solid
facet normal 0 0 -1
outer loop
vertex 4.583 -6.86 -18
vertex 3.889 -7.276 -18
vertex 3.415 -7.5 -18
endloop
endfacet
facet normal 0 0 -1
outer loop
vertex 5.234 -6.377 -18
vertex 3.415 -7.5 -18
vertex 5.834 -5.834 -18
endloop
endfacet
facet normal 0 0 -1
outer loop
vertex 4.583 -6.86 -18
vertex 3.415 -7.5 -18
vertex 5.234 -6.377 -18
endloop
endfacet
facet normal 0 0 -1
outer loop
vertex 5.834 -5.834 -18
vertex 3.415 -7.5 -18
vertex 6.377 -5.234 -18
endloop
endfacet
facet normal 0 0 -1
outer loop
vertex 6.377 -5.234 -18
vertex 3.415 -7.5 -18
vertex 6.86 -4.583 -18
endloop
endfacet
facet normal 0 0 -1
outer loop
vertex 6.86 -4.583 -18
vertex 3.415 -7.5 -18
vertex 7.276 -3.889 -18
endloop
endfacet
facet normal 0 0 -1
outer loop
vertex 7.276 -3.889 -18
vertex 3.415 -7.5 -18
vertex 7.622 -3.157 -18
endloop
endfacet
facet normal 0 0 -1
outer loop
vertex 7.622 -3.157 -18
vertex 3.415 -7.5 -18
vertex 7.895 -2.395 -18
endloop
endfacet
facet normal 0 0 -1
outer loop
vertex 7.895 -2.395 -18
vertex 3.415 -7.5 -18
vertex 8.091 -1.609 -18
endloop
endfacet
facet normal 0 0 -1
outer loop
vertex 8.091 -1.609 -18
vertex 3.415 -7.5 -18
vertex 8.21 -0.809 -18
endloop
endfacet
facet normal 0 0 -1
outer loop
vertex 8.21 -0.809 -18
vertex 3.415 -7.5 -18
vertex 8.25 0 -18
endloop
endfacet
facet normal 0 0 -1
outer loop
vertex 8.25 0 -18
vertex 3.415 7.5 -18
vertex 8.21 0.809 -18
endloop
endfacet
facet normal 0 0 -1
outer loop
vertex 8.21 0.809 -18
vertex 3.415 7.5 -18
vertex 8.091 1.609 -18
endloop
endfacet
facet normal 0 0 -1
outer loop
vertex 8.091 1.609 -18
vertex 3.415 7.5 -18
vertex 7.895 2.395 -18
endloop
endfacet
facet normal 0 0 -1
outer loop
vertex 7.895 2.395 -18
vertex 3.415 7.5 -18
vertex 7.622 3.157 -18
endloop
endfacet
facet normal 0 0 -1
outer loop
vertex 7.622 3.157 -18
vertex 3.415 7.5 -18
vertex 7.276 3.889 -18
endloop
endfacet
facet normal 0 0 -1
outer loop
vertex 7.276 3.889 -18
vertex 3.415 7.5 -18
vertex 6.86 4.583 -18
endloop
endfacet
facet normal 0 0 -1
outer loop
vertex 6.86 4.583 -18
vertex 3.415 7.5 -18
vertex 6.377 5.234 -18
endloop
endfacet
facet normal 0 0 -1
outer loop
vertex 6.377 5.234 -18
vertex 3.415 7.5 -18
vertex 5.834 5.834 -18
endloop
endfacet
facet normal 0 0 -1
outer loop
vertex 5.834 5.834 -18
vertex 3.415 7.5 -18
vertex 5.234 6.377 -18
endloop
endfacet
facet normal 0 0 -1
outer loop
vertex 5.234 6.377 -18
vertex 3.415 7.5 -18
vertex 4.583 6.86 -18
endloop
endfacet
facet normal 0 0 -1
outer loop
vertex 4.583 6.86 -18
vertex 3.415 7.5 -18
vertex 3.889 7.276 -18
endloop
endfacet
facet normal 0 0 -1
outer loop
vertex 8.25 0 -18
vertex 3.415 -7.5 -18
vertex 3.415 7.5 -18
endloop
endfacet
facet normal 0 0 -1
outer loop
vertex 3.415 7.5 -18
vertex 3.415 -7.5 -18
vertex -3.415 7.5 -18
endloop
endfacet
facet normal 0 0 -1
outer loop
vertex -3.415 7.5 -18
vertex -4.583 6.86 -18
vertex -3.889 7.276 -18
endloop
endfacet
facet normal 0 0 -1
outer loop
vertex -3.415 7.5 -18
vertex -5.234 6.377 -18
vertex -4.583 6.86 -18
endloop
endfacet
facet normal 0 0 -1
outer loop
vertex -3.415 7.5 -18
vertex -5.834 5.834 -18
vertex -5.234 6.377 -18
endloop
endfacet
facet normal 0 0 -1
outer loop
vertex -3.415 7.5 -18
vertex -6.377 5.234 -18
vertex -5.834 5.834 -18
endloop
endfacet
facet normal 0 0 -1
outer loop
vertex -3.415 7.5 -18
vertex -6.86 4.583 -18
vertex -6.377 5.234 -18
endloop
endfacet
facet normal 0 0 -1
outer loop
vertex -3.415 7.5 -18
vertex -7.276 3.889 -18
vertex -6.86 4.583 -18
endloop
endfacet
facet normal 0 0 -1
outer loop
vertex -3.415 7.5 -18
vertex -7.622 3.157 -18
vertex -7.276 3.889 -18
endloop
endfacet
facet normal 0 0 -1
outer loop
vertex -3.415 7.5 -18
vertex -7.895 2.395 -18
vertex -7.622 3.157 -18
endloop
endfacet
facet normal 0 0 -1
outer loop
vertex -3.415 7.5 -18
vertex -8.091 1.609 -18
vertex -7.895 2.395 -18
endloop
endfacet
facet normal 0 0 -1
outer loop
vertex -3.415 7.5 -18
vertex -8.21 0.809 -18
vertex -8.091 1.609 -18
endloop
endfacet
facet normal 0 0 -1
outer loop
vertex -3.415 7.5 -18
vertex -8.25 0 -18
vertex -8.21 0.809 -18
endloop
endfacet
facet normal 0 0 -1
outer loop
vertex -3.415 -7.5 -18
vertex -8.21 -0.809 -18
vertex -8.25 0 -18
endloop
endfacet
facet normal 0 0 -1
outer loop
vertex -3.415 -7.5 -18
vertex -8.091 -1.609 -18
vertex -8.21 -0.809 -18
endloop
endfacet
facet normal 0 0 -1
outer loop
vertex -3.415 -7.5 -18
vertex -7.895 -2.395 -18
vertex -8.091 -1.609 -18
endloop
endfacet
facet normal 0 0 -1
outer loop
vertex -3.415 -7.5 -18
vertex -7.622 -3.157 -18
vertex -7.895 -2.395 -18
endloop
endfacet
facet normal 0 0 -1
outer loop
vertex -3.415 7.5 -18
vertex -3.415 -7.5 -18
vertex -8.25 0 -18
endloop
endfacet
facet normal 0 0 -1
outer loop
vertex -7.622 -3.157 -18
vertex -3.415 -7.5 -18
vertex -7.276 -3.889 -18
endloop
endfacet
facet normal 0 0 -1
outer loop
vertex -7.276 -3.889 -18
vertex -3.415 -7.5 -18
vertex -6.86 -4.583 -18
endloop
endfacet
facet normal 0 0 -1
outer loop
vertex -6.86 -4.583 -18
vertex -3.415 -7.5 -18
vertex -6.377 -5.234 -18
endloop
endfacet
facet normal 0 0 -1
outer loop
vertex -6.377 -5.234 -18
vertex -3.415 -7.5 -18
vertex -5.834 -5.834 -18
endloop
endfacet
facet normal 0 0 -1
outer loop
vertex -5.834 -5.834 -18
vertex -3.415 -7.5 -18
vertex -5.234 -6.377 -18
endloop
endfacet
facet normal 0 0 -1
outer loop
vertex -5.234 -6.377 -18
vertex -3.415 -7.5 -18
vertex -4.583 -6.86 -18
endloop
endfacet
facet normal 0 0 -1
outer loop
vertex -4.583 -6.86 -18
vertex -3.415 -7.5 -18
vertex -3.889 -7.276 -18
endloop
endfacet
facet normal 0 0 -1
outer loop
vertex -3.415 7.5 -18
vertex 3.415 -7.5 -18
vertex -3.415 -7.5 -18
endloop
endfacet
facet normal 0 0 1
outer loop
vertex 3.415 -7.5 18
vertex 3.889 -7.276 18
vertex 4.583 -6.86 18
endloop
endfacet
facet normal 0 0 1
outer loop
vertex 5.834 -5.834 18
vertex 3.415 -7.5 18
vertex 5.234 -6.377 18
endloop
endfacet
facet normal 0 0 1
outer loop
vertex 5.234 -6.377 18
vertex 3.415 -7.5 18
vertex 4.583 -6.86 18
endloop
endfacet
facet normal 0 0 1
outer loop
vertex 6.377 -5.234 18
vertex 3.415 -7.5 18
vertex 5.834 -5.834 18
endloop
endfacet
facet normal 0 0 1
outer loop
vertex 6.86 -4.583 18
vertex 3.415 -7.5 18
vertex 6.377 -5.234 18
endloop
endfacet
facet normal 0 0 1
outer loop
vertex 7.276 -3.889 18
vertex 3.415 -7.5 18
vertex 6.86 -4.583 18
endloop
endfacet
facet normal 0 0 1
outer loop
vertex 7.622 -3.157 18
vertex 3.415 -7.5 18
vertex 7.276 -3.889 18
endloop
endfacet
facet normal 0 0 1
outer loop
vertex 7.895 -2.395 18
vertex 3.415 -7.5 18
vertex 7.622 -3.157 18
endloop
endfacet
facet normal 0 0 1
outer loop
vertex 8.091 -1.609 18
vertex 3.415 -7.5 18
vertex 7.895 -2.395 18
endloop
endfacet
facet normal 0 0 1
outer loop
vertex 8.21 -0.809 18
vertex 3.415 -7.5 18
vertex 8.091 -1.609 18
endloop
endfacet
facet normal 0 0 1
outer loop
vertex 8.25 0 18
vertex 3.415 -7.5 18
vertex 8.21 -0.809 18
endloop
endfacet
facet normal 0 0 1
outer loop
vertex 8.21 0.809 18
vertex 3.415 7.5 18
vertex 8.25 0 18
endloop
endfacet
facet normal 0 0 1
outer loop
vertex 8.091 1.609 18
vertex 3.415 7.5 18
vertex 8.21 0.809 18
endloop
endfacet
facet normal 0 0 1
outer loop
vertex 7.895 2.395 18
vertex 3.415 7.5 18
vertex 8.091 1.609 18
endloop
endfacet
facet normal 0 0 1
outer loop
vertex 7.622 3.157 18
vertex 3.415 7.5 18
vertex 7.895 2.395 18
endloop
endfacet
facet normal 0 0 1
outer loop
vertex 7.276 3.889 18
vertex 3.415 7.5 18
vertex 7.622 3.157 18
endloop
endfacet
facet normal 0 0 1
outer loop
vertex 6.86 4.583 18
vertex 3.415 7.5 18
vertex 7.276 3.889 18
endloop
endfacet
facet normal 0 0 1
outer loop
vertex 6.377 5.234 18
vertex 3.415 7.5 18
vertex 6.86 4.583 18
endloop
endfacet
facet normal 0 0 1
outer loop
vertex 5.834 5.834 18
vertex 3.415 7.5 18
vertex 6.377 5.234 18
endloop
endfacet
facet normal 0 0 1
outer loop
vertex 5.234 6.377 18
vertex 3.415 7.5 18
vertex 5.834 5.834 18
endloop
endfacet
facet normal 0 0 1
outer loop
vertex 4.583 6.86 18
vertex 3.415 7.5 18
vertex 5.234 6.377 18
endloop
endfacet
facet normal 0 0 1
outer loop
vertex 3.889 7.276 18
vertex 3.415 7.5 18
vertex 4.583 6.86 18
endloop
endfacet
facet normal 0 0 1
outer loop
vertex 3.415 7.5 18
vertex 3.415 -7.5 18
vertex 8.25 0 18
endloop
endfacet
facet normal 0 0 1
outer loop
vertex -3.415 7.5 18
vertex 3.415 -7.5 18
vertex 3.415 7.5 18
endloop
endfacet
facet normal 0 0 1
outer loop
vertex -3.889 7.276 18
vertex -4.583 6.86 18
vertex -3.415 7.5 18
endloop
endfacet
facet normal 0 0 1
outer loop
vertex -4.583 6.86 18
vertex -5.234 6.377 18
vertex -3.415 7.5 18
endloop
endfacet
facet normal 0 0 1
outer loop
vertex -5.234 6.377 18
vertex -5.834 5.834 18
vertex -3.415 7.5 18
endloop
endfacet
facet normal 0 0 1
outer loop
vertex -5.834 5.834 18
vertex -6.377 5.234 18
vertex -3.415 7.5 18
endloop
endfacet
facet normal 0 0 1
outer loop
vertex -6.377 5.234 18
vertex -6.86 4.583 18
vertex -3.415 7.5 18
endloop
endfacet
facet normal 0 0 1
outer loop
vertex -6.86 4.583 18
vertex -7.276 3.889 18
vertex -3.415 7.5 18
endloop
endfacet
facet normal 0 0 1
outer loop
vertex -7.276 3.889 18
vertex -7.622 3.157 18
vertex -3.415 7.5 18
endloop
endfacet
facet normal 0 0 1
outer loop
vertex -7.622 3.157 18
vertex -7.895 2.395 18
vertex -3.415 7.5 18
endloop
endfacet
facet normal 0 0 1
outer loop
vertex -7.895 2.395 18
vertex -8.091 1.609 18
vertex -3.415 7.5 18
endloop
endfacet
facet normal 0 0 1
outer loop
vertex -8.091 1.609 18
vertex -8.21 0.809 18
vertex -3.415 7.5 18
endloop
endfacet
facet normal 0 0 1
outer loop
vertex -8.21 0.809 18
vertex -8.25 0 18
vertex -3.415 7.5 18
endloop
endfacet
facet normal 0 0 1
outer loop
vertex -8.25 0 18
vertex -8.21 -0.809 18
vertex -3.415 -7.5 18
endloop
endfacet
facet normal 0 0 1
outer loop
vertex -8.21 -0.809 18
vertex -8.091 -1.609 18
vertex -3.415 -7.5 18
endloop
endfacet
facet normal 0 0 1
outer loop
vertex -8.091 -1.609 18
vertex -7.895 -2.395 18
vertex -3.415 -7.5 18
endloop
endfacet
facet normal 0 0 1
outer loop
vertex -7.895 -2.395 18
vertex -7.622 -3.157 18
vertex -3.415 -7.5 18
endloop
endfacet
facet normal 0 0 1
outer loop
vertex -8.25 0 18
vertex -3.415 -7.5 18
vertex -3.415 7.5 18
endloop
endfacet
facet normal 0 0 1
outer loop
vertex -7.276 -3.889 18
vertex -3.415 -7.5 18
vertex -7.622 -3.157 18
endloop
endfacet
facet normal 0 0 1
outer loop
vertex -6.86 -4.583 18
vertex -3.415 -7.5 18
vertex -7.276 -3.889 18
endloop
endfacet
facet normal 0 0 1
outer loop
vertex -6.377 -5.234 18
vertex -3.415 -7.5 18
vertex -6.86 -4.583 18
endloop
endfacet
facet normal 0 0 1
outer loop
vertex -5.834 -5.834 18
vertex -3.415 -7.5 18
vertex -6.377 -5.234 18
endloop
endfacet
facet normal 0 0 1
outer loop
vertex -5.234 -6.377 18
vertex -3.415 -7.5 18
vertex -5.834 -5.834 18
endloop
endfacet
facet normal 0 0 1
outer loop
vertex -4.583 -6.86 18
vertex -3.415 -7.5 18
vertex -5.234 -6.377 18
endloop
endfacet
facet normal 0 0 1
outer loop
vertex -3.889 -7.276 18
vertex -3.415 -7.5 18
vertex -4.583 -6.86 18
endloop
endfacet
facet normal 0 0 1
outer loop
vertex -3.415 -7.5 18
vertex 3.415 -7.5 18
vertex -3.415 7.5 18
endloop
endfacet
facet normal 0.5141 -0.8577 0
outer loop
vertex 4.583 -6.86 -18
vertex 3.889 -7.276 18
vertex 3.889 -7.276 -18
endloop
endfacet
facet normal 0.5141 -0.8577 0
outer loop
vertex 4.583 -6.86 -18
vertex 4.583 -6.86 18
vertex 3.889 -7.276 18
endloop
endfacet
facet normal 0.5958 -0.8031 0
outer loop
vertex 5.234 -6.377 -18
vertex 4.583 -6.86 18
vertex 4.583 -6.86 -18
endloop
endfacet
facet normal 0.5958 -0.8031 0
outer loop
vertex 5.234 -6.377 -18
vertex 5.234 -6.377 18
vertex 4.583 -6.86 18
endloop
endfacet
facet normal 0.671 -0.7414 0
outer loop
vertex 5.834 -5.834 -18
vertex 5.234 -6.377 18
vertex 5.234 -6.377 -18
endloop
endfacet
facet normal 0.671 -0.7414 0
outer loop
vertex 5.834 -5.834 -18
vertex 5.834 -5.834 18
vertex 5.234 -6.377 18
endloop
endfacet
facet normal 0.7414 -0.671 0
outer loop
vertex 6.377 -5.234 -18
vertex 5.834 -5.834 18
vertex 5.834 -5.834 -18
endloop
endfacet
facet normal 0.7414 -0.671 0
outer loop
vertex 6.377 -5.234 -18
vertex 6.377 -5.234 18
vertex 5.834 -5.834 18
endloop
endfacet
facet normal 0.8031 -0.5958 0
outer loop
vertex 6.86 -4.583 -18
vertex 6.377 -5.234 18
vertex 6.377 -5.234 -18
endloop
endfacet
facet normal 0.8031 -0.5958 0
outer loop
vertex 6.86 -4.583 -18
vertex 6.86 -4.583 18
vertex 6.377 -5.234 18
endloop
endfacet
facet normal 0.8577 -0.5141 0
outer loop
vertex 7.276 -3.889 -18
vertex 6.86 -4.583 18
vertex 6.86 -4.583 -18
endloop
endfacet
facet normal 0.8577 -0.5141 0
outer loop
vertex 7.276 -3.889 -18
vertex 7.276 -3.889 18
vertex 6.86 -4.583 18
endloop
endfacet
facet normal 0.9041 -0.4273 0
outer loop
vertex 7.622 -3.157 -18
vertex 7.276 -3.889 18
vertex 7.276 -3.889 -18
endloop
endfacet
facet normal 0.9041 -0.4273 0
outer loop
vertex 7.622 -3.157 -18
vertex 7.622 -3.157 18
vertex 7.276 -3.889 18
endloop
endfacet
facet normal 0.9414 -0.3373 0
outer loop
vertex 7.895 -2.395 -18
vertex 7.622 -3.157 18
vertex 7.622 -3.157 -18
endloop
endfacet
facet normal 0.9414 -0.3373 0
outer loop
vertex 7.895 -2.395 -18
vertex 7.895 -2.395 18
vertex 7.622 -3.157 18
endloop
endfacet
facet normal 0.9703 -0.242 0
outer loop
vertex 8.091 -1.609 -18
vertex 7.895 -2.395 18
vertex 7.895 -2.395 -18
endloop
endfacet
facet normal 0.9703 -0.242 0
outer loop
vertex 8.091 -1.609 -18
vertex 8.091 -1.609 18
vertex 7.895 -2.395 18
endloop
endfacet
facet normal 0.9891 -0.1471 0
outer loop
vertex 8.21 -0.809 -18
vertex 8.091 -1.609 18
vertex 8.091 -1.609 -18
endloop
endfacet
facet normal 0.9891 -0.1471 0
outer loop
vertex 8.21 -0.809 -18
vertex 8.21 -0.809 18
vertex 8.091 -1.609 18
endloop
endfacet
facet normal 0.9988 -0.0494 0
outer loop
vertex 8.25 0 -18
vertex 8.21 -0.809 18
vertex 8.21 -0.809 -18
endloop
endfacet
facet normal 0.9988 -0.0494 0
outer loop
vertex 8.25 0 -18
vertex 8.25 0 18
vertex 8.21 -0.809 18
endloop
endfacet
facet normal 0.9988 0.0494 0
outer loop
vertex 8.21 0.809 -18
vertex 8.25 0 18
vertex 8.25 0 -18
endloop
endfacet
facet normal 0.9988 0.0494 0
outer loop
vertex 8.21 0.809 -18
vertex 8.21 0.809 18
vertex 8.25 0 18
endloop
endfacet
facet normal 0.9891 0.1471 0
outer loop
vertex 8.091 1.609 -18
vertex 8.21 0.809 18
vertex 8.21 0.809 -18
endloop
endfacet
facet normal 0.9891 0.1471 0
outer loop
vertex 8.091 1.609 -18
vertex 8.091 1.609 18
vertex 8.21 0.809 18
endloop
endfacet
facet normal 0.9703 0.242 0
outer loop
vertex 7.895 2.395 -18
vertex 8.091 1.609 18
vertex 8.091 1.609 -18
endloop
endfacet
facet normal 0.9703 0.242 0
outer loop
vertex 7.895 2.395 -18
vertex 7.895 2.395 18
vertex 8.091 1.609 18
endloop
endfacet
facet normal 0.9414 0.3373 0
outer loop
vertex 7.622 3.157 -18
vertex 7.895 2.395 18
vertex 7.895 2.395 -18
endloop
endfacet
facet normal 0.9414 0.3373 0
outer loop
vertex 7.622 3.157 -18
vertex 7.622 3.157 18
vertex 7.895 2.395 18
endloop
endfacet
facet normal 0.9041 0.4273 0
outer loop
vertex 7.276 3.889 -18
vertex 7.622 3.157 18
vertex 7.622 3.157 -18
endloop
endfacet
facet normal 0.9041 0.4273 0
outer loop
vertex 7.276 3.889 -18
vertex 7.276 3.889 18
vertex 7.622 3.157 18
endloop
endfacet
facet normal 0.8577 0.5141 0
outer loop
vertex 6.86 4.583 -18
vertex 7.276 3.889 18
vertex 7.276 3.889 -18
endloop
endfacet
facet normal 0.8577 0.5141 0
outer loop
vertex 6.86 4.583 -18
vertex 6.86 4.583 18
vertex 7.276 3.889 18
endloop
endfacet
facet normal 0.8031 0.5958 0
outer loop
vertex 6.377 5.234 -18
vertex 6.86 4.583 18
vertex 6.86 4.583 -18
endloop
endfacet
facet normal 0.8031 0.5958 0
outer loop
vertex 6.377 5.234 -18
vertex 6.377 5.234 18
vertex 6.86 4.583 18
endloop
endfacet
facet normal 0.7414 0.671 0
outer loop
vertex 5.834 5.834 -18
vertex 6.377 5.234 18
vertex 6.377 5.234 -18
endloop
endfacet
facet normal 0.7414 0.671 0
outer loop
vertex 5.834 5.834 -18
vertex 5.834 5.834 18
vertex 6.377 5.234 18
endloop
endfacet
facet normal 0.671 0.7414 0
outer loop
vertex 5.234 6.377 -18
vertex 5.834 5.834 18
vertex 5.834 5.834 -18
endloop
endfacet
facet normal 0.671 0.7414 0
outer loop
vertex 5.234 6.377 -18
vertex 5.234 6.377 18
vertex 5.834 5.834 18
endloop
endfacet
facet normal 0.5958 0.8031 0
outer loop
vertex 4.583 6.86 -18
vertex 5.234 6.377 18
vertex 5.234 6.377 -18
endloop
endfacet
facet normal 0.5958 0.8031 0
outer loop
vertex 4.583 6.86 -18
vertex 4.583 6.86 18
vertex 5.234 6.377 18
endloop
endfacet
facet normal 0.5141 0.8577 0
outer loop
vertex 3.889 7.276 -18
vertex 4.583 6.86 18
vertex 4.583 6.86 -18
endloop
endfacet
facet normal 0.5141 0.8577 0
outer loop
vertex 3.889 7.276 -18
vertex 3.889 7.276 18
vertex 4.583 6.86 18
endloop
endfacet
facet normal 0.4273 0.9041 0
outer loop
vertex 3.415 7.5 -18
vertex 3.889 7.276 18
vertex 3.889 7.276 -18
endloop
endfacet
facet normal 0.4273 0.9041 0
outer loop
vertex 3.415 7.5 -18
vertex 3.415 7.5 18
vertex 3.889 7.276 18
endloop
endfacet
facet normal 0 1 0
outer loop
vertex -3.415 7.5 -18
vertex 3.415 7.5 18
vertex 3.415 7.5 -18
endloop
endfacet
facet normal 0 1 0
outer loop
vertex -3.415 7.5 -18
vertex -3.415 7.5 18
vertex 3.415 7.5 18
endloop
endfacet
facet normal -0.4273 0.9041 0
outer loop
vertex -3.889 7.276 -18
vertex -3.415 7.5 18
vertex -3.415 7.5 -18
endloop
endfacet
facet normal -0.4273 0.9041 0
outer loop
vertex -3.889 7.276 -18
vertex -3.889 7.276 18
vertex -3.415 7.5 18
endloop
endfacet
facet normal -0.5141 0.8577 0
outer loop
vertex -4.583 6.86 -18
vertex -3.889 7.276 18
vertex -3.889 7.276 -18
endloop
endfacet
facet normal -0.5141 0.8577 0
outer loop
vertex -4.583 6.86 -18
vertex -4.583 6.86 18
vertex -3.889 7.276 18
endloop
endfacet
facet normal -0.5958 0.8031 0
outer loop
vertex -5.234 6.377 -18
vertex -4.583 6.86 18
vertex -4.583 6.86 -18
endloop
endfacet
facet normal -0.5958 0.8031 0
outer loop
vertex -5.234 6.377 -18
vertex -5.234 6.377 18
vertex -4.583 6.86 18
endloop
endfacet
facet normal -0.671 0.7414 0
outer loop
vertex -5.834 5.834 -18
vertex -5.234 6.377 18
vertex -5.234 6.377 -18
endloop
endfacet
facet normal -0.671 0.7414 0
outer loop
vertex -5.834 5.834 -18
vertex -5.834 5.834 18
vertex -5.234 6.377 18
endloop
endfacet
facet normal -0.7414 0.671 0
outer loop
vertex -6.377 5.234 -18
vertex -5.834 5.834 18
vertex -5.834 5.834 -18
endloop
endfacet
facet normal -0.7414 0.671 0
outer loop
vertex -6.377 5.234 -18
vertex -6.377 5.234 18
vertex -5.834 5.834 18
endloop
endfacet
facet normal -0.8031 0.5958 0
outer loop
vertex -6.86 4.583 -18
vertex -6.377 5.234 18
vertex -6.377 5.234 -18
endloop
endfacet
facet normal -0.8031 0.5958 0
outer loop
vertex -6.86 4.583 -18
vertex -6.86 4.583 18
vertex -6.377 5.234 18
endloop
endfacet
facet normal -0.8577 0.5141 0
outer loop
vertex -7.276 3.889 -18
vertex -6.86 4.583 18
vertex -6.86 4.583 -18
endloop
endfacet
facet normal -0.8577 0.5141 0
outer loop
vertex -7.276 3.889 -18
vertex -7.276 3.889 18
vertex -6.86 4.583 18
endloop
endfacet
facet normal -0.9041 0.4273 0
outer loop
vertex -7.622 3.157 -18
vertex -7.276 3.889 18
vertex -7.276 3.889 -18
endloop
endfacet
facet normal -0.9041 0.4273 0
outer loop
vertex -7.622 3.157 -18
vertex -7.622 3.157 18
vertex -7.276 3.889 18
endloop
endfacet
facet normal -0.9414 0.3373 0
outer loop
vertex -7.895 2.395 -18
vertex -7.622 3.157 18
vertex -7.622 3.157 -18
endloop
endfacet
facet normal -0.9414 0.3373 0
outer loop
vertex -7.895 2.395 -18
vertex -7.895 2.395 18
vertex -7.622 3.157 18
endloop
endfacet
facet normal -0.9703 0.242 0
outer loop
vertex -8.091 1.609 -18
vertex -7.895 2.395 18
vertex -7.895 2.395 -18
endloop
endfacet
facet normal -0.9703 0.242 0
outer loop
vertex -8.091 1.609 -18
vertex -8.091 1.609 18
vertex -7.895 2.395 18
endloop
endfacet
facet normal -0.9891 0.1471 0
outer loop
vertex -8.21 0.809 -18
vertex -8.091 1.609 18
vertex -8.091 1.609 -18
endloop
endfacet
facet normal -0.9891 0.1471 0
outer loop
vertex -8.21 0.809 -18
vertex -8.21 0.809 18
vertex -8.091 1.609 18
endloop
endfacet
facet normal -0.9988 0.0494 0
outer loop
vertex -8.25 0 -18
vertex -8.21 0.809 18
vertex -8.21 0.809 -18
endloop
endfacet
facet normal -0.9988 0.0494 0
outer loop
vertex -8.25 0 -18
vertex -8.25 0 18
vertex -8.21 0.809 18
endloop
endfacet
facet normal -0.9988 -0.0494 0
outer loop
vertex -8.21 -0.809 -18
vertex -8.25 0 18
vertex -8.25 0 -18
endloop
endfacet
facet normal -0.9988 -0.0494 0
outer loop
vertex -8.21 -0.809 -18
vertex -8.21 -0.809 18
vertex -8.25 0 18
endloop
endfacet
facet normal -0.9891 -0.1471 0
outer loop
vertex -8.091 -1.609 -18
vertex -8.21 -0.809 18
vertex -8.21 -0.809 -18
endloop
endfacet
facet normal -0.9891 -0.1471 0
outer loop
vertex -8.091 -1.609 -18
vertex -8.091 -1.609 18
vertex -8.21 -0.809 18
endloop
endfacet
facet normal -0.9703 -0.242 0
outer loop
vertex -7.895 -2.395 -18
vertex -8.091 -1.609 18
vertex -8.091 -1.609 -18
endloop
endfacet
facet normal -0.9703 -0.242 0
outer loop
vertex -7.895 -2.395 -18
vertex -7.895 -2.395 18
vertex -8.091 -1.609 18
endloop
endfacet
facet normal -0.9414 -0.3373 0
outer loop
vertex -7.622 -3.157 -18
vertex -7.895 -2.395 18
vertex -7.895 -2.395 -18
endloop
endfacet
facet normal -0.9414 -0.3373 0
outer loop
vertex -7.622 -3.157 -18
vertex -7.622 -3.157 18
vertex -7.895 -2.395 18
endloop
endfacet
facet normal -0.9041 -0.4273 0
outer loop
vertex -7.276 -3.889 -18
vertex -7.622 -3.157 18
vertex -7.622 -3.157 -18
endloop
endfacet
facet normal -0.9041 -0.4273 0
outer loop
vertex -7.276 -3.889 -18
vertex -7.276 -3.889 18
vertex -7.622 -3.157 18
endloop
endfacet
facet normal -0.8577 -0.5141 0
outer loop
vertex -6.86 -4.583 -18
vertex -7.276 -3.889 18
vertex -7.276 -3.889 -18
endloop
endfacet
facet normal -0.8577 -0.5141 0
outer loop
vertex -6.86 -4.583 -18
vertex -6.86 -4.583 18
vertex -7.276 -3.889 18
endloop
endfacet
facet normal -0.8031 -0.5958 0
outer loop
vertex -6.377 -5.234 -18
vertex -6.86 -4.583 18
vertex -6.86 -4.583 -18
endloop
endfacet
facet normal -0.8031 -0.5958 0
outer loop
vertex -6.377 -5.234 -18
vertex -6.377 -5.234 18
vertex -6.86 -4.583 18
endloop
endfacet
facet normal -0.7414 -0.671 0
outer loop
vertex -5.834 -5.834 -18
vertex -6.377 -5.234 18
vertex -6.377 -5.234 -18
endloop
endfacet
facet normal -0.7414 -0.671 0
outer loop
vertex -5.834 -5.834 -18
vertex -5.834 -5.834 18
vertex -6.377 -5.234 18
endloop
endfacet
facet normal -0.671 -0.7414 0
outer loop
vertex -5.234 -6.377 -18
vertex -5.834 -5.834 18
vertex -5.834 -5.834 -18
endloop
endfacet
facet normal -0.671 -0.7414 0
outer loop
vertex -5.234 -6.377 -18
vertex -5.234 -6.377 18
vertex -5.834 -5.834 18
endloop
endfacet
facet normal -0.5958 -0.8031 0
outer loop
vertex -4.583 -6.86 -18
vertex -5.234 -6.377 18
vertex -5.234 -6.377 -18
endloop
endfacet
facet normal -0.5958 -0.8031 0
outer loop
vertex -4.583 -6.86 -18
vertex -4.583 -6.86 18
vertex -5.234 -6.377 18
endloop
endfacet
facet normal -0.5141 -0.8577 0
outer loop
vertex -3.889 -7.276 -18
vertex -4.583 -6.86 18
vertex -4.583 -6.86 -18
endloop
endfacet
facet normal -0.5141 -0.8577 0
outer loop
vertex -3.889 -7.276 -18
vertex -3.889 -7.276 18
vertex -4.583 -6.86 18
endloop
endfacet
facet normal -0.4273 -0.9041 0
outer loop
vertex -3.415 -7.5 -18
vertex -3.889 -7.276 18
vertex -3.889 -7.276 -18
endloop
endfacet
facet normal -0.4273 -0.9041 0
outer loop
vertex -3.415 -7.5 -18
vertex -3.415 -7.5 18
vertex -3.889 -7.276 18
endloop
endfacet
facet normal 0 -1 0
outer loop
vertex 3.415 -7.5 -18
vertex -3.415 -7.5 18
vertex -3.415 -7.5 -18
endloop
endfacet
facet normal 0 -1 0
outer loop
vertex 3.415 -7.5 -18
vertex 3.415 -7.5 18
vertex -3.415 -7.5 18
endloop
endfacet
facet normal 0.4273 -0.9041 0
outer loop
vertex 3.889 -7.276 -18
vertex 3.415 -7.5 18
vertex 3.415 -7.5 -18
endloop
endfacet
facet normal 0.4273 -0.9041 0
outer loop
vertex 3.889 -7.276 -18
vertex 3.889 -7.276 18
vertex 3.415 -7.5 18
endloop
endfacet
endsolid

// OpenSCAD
$fn = 64;

Button();

module Button() {
    linear_extrude(36, center=true) intersection() {
        circle(d=16.5);
        square([16.5,15], true);
    }
}
